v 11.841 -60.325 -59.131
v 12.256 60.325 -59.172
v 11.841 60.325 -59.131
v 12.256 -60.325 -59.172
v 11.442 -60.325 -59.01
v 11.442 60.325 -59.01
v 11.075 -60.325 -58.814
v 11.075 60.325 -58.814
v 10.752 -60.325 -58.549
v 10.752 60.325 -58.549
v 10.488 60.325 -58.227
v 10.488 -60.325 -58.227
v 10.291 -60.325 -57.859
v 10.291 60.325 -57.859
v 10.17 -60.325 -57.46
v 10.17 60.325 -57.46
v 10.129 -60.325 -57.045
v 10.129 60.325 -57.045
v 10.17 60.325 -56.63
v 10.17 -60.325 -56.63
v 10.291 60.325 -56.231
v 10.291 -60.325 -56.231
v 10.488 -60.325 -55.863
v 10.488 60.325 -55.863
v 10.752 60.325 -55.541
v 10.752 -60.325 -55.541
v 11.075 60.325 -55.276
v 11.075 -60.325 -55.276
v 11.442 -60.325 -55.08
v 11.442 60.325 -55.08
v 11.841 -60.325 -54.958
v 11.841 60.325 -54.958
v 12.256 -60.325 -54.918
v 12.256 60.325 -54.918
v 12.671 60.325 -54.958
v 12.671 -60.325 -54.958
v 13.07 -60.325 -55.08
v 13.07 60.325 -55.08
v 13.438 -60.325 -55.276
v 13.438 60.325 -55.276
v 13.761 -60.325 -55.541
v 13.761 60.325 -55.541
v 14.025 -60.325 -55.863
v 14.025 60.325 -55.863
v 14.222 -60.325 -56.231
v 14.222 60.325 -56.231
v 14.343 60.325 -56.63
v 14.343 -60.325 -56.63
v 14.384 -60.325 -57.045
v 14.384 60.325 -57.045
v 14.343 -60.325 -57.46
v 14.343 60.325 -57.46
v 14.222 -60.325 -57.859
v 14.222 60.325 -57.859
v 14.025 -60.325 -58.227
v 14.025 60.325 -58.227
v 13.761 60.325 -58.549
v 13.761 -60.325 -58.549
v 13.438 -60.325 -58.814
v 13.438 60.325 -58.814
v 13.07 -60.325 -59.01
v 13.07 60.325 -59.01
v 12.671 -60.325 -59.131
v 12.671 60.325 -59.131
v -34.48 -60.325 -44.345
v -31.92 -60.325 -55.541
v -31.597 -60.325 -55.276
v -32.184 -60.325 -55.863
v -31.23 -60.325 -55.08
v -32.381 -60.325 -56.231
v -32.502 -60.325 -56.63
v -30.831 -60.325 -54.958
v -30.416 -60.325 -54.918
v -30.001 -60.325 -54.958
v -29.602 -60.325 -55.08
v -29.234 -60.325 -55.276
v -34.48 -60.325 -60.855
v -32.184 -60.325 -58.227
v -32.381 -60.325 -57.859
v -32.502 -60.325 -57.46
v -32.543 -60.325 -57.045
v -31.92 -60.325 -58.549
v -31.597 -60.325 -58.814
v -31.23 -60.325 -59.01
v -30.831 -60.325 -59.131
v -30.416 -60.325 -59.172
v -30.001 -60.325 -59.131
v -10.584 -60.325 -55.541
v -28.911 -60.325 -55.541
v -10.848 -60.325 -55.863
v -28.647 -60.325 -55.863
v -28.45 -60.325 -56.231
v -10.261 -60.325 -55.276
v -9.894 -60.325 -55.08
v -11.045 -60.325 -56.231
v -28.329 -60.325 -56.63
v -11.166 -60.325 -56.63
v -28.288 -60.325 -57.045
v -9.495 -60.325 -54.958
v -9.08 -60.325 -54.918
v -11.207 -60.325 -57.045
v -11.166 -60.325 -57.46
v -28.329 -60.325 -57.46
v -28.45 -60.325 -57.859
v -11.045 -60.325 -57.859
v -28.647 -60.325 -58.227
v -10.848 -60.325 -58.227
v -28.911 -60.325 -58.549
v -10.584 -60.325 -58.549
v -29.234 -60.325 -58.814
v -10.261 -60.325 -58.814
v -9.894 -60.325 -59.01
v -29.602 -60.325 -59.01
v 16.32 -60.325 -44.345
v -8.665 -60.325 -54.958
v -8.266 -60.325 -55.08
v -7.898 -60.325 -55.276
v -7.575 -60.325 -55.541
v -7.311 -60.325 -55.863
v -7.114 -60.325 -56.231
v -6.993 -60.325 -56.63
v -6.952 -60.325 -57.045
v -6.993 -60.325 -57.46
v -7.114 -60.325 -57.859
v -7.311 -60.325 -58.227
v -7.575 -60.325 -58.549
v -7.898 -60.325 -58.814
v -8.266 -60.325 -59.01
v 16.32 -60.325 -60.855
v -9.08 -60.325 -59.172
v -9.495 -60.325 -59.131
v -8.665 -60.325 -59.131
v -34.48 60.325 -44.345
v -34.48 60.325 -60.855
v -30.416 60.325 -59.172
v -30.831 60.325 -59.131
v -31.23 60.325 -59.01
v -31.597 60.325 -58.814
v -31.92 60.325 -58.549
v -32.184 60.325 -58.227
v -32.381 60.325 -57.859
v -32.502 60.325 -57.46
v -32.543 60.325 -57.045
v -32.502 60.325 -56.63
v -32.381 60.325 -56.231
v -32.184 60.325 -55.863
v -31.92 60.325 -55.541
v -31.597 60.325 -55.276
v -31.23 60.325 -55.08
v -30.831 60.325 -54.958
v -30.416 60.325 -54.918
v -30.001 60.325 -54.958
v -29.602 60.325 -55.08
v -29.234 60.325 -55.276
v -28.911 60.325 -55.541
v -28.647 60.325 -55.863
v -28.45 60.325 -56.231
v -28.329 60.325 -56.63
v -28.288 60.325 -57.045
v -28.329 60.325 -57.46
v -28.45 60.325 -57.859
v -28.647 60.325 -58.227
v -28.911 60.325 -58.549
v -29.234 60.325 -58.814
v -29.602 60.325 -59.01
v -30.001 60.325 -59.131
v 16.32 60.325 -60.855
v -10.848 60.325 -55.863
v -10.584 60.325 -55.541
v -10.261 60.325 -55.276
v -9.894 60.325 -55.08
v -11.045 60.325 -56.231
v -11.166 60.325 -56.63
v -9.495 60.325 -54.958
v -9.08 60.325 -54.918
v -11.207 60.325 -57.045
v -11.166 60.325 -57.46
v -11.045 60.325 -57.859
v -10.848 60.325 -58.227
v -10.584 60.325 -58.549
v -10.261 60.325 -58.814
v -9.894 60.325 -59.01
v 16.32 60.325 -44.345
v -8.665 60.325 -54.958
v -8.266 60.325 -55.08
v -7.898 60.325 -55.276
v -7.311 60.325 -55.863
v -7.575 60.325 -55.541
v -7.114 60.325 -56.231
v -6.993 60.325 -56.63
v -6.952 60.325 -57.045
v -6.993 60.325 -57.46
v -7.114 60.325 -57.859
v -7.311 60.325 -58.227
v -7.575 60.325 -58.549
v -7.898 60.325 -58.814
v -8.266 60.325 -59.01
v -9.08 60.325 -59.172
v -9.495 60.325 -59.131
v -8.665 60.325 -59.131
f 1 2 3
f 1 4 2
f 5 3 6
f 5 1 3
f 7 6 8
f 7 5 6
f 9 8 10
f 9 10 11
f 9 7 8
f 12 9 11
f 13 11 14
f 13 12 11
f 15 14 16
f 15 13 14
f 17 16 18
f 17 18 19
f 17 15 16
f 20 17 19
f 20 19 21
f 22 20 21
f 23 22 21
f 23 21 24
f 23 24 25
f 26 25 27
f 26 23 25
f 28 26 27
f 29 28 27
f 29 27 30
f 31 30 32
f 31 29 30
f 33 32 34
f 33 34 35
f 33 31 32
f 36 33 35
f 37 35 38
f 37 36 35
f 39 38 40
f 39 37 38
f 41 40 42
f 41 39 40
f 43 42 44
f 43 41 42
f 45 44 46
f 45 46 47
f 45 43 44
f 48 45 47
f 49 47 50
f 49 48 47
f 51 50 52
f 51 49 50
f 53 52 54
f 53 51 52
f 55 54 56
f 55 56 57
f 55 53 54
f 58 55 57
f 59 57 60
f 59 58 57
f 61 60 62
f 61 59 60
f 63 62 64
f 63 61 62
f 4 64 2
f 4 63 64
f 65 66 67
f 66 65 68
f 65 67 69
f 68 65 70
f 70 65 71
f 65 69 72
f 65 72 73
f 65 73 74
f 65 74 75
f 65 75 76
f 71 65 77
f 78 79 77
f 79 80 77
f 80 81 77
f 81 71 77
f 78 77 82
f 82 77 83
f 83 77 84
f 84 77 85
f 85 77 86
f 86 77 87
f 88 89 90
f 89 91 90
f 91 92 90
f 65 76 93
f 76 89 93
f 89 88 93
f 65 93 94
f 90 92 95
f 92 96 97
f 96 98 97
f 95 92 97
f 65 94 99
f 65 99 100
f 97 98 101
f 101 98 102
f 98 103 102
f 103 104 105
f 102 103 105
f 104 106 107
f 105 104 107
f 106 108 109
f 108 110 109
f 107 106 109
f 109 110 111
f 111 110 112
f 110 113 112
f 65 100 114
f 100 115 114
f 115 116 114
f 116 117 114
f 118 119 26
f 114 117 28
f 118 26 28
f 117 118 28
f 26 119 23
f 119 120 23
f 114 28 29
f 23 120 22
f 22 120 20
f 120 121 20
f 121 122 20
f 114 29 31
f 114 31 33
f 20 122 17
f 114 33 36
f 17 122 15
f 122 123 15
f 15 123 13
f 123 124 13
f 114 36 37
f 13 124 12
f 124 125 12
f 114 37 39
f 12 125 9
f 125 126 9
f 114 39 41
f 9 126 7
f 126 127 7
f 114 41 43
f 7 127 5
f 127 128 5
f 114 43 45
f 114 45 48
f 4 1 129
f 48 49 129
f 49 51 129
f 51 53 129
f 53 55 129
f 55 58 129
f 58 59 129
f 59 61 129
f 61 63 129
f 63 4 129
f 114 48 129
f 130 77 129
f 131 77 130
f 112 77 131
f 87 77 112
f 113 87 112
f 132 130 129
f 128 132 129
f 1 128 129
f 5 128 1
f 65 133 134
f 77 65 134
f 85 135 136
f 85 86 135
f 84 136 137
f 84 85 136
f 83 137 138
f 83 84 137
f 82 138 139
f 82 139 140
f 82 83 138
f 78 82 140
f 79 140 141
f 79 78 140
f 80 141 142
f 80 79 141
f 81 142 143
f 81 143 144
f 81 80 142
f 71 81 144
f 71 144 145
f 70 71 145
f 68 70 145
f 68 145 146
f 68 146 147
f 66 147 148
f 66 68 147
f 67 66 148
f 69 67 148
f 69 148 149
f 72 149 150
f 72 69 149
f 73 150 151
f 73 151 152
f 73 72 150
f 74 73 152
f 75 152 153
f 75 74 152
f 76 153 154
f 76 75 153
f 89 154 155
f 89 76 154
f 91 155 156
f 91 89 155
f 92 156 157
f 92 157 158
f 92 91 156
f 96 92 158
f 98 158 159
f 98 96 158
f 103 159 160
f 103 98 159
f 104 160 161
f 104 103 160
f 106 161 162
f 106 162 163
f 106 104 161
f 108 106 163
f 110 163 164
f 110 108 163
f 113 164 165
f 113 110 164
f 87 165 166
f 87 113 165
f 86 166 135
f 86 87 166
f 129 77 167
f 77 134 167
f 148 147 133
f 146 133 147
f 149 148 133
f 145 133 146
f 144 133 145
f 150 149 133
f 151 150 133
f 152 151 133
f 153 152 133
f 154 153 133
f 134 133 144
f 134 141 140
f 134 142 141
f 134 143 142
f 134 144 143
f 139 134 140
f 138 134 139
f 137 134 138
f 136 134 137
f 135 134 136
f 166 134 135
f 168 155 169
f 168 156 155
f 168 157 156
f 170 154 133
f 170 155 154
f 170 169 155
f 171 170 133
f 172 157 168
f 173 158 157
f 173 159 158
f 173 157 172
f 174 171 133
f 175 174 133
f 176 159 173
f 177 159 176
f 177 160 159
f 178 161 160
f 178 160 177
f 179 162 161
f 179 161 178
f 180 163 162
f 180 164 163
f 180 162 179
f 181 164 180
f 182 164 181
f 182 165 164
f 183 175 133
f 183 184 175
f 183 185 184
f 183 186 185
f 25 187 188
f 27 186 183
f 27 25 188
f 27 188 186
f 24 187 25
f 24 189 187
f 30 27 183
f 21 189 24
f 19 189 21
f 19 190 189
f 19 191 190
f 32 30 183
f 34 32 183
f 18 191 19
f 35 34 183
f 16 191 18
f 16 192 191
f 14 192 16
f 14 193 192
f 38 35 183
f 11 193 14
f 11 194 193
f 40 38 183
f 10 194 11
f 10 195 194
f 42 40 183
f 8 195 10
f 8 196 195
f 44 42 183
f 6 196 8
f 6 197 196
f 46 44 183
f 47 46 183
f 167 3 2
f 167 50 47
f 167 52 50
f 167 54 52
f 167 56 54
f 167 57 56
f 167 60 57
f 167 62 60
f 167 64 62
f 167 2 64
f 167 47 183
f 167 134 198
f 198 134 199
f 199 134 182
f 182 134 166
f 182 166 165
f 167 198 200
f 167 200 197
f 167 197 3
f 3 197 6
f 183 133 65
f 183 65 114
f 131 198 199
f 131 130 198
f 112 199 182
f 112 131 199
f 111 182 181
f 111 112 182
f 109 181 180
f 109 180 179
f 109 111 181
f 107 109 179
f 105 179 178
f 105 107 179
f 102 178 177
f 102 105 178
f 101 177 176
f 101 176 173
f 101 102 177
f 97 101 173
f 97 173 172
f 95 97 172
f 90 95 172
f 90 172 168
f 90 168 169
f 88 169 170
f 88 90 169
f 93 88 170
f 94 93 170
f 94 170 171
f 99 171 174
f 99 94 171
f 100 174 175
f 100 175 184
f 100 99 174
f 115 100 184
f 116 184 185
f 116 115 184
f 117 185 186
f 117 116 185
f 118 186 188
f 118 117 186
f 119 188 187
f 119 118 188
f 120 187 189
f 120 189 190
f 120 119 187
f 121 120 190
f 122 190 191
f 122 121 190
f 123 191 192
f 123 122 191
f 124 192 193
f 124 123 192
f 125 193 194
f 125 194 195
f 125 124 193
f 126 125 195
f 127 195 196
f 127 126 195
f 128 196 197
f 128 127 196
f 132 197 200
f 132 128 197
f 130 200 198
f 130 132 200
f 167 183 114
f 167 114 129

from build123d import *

# Parameters (mm, degrees)
SKETCH1_W           = 50.8
SKETCH1_H           = 7.62
SKETCH1_R           = 2.12725
BOSS_EXTRUDE1_DEPTH = 60.325
SKETCH2_W           = 50.8
SKETCH2_H           = 8.89
BOSS_EXTRUDE2_DEPTH = 60.325


with BuildPart() as part:
    # Sketch1 → Boss-Extrude1 (new, symmetric)
    with BuildSketch(Plane(origin=(0, 0, 0), x_dir=(1, 0, 0), z_dir=(0, 1, 0))):
        with Locations((-9.079617512, 57.044833819)):
            Rectangle(SKETCH1_W, SKETCH1_H)
        with Locations(Location((-30.415617512, 57.044833819, 0), (0, 0, 90))):
            Circle(SKETCH1_R, mode=Mode.SUBTRACT)
        with Locations(Location((-9.079617512, 57.044833819, 0), (0, 0, 90))):
            Circle(SKETCH1_R, mode=Mode.SUBTRACT)
        with Locations(Location((12.256382488, 57.044833819, 0), (0, 0, 90))):
            Circle(SKETCH1_R, mode=Mode.SUBTRACT)
    extrude(amount=BOSS_EXTRUDE1_DEPTH, both=True)

    # Sketch2 → Boss-Extrude2 (add, symmetric)
    with BuildSketch(Plane(origin=(0, 0, 0), x_dir=(1, 0, 0), z_dir=(0, 1, 0))):
        with Locations((-9.079617512, 48.789833819)):
            Rectangle(SKETCH2_W, SKETCH2_H)
    extrude(amount=BOSS_EXTRUDE2_DEPTH, both=True)


solid = part.part
